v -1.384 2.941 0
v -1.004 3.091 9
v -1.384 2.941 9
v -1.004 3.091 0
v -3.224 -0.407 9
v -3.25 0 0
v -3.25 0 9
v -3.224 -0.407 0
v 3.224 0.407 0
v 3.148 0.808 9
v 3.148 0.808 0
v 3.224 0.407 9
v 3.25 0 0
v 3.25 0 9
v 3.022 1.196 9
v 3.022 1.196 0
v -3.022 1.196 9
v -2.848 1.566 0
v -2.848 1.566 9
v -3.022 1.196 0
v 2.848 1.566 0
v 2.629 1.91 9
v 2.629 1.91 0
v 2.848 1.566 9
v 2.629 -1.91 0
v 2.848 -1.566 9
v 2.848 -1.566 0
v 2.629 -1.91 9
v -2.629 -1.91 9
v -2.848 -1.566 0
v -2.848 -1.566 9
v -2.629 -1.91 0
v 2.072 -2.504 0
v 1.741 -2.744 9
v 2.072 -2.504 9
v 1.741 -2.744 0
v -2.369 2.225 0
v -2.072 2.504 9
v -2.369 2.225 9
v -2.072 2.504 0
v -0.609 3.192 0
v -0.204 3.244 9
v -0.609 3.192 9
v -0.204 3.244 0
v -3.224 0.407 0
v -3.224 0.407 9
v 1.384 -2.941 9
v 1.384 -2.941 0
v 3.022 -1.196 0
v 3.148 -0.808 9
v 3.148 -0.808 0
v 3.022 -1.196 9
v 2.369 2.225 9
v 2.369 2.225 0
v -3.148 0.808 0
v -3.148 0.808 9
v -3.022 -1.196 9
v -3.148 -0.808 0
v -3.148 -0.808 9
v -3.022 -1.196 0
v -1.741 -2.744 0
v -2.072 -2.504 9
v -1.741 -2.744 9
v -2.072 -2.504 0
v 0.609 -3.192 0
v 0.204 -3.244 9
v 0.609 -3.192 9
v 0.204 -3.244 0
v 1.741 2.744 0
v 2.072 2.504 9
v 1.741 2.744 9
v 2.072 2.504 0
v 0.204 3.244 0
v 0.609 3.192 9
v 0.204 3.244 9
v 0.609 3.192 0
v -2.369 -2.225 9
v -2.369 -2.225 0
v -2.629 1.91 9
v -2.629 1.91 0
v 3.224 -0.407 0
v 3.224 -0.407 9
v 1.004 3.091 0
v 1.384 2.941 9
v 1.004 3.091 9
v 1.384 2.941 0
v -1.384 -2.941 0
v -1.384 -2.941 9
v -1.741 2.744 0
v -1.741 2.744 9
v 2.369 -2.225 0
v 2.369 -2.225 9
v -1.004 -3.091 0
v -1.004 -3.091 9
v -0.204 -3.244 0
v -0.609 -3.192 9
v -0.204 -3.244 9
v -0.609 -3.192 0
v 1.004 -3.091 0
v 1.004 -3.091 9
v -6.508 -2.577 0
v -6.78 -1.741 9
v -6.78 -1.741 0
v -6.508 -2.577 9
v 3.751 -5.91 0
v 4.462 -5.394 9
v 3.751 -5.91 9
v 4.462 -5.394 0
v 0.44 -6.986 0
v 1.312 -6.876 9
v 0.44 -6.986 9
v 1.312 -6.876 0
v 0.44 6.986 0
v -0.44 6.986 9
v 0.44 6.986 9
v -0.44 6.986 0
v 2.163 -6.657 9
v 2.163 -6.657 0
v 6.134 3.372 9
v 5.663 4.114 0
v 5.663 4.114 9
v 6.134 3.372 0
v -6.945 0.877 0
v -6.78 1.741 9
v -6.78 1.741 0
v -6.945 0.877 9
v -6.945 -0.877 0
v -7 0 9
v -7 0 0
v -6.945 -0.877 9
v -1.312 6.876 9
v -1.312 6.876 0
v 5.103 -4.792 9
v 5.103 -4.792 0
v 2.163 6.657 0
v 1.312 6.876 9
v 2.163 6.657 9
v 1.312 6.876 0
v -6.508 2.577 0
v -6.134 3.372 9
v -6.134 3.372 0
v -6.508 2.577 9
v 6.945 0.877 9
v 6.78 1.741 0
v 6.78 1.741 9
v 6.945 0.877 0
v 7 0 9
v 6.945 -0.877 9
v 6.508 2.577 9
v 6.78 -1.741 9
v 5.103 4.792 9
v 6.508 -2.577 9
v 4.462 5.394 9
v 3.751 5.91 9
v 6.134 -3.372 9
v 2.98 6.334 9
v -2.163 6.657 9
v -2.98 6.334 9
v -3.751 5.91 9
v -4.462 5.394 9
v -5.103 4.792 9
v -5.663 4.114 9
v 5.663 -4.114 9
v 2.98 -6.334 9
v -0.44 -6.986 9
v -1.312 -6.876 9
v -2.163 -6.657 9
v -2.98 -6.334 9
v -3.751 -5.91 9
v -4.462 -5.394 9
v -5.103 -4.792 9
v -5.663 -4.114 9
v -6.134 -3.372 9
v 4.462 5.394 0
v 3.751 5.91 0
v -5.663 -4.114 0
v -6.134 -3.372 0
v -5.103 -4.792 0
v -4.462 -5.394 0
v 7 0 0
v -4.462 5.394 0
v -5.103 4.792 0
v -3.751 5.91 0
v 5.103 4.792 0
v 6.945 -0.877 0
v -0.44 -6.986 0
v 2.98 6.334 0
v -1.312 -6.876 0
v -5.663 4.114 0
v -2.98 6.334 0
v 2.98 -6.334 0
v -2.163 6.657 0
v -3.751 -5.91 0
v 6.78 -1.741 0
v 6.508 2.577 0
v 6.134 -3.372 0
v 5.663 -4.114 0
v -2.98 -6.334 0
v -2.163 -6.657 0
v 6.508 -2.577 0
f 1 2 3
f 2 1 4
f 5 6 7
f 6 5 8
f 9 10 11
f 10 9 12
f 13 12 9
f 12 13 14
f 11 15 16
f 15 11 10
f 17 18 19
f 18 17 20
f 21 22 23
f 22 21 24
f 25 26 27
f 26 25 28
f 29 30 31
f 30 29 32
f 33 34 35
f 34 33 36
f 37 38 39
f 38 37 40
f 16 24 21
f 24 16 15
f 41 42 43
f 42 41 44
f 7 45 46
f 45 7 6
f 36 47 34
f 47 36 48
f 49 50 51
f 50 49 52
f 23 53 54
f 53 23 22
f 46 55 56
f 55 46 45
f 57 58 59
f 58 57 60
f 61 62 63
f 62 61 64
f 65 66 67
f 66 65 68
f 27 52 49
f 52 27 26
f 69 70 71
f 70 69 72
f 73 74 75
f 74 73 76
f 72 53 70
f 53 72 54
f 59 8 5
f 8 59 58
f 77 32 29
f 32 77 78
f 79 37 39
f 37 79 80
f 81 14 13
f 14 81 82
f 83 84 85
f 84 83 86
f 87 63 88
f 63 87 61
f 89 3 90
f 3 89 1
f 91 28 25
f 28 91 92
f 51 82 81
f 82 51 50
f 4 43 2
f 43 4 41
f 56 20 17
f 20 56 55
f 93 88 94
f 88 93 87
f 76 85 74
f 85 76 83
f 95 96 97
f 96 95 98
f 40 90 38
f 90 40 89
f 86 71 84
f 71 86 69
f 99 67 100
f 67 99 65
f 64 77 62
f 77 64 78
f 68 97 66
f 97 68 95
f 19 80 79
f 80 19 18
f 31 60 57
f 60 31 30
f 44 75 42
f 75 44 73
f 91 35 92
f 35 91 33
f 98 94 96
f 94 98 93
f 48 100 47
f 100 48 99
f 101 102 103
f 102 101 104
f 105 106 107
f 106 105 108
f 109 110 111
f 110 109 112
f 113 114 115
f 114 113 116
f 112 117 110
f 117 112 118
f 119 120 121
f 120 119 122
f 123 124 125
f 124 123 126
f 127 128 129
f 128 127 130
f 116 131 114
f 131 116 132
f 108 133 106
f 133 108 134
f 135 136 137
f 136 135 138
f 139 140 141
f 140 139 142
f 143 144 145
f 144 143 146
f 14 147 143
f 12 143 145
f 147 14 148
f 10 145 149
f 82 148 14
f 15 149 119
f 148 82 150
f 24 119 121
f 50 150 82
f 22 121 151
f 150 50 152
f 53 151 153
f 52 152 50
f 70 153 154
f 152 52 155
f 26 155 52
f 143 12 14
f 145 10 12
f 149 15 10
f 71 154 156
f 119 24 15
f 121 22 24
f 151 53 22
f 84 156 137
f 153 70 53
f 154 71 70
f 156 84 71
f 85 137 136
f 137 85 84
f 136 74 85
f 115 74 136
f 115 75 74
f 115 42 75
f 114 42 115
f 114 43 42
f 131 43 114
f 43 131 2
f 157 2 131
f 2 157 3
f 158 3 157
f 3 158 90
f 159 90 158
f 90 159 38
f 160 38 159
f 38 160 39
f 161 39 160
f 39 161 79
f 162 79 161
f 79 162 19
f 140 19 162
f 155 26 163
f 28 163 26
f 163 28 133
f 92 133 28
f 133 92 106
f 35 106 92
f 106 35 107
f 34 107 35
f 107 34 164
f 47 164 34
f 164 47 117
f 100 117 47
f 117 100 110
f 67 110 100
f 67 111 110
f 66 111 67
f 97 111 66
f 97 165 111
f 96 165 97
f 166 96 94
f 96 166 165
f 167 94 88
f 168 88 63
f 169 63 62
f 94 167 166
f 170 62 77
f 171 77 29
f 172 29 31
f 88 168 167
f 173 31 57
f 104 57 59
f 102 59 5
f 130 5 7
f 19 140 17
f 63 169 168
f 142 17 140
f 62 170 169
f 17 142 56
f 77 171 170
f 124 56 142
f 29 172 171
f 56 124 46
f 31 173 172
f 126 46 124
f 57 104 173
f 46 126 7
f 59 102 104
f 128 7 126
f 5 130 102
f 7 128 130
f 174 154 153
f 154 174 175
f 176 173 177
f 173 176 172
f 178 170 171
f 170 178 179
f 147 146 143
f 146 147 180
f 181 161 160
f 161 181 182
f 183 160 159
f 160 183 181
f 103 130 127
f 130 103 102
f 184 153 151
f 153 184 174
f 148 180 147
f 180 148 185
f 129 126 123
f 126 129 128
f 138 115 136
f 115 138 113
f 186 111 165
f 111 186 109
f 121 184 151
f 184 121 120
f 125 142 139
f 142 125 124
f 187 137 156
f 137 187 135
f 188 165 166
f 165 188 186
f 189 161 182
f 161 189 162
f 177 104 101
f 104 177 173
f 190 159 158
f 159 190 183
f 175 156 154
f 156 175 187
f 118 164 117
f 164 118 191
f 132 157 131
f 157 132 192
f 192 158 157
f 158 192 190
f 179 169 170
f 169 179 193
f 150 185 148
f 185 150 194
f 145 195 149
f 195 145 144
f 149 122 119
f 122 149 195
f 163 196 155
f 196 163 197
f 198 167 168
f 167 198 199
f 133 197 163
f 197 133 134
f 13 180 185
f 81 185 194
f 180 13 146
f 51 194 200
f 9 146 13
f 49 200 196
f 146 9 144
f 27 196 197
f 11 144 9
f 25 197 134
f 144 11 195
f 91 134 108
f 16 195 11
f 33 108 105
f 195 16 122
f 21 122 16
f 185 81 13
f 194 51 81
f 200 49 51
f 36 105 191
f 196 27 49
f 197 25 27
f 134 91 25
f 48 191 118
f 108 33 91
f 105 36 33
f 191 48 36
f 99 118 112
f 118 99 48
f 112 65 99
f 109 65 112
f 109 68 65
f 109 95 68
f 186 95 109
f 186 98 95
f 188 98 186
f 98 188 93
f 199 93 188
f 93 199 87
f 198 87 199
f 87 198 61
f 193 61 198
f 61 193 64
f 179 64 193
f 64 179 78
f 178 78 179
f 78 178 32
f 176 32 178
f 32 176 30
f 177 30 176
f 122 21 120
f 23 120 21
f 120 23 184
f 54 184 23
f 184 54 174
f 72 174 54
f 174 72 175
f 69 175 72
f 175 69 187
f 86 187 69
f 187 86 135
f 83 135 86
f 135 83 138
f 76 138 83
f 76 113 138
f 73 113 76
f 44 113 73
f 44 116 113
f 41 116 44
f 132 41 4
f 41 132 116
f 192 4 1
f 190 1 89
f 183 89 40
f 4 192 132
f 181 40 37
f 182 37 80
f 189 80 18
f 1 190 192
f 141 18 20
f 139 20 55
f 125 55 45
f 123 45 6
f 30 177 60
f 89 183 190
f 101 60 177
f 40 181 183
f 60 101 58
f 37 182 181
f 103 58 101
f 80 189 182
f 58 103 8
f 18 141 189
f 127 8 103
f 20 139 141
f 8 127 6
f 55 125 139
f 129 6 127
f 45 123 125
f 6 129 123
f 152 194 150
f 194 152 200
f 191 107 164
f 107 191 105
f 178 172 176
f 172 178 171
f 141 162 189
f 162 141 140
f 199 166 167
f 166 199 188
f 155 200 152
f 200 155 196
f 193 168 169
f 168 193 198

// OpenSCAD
$fn = 50;

difference() {
	union() {
		cylinder(h = 9, r = 7.0);
	}
	union() {
		translate(v = [0.0, 0.0, -100.0]) {
			cylinder(h = 200, r = 3.25);
		}
		translate(v = [0.0, 0.0, -100.0]) {
			cylinder(h = 200, r = 1.8);
		}
		cylinder(h = 9, r = 2.5);
	}
}
